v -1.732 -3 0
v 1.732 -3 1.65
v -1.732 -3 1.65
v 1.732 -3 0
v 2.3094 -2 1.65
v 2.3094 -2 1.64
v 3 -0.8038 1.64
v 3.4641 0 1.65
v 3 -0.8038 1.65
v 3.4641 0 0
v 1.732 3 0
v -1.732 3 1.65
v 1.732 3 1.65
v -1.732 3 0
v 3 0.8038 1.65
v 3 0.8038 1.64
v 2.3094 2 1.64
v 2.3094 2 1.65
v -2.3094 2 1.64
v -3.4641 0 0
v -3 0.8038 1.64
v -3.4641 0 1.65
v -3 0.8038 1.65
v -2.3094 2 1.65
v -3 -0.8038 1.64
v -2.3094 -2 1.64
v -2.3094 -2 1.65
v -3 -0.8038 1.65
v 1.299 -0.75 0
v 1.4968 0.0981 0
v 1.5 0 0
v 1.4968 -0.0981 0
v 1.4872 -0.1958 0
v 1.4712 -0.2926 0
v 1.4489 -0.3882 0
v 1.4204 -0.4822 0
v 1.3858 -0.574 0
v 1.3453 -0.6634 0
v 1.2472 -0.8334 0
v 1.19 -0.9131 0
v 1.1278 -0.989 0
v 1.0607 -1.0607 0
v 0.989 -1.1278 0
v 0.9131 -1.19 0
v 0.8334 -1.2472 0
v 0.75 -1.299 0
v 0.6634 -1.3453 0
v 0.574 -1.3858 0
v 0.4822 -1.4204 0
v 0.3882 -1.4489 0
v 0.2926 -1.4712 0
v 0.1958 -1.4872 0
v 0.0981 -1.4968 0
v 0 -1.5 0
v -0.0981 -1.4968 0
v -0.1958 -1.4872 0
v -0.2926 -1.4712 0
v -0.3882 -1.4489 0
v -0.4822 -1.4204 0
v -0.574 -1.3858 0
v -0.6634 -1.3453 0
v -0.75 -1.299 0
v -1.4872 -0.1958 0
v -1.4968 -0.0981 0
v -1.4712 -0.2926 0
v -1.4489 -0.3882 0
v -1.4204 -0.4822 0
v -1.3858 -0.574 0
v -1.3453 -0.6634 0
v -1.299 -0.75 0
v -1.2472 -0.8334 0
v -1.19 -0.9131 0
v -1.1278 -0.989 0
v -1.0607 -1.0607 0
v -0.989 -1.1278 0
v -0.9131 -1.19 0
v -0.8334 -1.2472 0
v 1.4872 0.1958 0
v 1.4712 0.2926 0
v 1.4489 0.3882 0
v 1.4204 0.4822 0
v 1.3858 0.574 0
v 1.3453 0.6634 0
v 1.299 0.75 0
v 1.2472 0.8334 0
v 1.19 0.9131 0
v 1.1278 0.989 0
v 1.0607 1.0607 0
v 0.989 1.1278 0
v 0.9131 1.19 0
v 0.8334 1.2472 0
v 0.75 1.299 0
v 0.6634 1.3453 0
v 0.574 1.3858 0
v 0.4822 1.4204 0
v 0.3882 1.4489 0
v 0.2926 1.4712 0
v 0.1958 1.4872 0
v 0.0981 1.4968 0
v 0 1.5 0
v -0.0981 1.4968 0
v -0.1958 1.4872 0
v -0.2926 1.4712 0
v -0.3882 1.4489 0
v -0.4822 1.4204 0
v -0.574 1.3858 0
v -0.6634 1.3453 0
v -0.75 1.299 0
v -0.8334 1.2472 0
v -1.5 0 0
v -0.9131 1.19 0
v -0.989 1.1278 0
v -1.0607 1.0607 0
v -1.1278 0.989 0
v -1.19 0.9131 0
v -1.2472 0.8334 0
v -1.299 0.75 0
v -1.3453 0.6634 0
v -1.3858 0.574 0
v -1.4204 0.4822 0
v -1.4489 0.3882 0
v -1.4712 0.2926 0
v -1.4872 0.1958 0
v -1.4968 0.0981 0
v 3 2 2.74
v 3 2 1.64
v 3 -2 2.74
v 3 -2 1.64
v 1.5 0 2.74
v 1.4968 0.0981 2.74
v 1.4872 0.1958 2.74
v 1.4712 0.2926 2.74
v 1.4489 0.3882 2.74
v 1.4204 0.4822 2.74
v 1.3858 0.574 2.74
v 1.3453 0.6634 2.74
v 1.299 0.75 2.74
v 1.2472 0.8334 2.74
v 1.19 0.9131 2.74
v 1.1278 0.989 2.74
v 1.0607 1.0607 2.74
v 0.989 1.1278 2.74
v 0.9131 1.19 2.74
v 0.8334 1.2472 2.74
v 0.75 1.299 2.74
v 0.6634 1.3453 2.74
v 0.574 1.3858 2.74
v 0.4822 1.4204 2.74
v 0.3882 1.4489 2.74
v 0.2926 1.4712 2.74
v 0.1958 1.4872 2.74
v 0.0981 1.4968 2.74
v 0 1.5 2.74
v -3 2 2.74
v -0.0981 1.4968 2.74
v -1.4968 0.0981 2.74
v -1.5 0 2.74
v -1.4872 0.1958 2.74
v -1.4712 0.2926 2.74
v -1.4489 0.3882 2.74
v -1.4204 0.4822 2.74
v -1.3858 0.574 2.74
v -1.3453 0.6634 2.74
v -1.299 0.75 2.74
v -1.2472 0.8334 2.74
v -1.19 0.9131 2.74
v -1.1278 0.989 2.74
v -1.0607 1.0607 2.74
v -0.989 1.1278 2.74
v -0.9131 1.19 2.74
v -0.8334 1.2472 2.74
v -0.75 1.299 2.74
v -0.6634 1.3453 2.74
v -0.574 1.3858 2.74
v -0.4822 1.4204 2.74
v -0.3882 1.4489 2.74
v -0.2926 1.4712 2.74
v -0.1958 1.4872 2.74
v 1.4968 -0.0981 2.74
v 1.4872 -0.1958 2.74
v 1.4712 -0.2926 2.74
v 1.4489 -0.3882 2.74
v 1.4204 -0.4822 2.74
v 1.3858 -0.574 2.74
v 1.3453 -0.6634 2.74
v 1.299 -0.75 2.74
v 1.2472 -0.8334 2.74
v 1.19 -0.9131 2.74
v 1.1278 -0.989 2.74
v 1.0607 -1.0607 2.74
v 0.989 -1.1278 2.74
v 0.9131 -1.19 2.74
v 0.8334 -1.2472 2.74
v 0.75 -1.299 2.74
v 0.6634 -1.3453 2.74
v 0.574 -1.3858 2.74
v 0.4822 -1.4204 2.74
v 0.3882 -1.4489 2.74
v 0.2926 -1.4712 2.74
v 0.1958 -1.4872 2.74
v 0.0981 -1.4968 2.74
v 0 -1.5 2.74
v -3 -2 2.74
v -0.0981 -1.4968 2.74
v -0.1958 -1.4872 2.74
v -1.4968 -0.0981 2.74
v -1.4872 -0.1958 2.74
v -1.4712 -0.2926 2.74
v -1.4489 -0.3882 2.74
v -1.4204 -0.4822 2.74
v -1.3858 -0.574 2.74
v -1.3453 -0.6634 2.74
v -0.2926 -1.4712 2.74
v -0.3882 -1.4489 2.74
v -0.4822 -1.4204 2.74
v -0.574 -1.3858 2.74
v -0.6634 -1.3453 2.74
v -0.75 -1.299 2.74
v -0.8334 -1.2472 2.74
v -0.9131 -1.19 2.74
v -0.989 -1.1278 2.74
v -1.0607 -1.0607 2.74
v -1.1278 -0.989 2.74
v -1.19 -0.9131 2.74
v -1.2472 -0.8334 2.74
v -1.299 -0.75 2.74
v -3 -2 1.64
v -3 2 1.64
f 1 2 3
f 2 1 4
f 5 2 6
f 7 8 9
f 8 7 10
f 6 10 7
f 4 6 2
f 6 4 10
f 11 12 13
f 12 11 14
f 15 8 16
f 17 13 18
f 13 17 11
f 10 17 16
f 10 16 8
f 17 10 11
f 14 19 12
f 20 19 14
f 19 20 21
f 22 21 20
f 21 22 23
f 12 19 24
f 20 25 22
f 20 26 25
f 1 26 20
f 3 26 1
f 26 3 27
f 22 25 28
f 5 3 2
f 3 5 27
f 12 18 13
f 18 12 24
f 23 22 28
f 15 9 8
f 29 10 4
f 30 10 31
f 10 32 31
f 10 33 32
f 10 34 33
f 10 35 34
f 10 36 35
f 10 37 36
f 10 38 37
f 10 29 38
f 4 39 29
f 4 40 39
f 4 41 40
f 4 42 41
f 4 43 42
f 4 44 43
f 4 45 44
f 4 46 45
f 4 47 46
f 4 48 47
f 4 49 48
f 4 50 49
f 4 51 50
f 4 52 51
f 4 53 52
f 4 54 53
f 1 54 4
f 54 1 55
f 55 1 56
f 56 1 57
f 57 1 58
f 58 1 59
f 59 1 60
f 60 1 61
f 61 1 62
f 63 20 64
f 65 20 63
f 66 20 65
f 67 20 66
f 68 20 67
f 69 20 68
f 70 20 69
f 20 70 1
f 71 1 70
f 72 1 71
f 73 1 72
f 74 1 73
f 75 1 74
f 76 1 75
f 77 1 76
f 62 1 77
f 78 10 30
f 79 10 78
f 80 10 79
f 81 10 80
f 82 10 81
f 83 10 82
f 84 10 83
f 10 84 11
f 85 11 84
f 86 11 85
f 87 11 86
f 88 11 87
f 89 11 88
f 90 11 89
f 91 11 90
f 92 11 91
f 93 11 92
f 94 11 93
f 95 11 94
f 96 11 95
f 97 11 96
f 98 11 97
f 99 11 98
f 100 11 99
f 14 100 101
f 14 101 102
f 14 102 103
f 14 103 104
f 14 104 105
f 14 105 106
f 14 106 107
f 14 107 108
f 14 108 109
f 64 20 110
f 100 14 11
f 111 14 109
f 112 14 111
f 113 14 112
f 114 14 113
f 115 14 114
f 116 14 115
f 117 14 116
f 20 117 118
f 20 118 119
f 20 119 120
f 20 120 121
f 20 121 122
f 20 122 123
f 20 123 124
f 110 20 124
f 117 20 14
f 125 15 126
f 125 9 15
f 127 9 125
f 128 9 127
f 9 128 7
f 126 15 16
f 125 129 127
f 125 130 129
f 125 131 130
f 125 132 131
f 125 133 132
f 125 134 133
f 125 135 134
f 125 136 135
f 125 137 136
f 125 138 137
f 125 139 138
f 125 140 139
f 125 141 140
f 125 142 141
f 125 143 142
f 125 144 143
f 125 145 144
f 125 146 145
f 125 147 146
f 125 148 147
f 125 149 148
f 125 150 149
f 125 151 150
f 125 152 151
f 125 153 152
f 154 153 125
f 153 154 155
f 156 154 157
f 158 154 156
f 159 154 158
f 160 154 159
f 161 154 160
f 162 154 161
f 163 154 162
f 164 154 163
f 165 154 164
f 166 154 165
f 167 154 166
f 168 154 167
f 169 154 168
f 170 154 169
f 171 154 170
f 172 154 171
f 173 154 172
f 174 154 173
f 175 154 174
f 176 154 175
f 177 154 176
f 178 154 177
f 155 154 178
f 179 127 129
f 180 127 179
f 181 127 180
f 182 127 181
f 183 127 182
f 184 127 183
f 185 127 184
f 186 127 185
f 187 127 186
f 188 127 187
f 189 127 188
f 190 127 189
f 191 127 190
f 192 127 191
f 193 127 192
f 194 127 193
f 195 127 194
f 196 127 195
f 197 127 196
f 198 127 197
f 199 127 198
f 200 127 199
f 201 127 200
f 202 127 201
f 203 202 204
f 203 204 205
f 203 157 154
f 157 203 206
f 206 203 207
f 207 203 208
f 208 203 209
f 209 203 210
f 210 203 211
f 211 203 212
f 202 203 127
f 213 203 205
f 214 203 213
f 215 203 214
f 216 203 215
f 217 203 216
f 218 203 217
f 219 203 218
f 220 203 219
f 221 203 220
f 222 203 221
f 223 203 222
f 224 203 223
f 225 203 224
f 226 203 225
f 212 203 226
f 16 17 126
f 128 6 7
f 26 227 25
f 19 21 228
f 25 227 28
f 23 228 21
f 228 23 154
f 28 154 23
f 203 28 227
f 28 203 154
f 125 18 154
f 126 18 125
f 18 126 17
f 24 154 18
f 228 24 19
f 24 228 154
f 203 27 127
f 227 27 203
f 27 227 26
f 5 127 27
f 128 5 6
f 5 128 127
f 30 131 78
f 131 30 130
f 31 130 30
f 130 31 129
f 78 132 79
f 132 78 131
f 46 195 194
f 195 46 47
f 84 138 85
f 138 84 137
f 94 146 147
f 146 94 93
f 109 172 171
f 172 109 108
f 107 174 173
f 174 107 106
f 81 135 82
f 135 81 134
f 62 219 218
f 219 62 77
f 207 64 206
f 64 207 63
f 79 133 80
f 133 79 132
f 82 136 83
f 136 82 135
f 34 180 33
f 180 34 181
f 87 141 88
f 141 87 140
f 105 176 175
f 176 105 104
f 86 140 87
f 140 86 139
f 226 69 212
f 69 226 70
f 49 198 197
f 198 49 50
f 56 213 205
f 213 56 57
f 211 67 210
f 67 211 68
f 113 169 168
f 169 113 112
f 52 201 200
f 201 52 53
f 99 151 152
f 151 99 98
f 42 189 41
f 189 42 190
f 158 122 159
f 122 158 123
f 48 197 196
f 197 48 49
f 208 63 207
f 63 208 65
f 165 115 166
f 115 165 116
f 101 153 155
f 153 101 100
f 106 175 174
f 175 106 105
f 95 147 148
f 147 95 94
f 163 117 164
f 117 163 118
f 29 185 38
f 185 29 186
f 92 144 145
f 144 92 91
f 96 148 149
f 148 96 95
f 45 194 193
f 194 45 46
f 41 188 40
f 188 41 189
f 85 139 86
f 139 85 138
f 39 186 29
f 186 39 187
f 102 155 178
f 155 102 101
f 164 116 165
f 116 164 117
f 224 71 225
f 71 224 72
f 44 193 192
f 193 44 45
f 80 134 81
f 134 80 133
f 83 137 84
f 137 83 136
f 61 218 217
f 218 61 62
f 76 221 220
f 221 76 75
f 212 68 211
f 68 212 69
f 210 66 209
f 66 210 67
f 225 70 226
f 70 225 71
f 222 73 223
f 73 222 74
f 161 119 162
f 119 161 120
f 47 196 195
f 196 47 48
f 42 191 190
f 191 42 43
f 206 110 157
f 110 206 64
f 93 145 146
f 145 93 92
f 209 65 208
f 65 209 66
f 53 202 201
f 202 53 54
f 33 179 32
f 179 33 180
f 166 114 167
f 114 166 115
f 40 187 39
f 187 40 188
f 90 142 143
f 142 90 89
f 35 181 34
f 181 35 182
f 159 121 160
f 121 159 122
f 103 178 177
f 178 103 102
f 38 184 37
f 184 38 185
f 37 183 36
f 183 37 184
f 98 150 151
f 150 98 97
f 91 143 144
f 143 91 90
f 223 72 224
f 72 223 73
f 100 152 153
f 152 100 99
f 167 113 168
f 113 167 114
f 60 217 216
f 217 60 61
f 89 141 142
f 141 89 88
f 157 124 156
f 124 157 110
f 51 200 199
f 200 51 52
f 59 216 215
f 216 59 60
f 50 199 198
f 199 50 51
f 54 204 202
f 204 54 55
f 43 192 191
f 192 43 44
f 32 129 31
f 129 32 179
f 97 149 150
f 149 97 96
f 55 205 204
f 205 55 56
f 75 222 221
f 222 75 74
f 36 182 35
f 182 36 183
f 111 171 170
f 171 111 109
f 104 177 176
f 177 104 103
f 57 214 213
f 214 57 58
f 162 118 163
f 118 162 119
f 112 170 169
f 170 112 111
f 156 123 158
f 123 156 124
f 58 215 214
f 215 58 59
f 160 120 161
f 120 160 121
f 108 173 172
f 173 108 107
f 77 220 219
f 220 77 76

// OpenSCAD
$fn = 96;

module t_slot_nut(
    af = 6.0,          // across flats
    thick = 2.75,      // overall thickness
    screw_d = 3.0,     // M3 clearance
    neck_w = 4.0,      // narrow "neck" width for T-slot engagement
    neck_h = 1.10      // height of the neck (undercut step)
) {
    // Derived dimensions
    r_hex = af / sqrt(3);                 // circumradius for across-flats hex
    neck_h_clamped = min(neck_h, thick);  // safety
    base_h = thick - neck_h_clamped;

    difference() {
        union() {
            // Base: hex prism (across flats = af)
            translate([0, 0, base_h/2])
                cylinder(h = base_h, r = r_hex, $fn = 6, center = true);

            // Neck: narrower rectangular step on top to create T-profile/undercut
            // Overlap by a tiny amount to guarantee connectivity
            translate([0, 0, base_h + neck_h_clamped/2 - 0.01])
                cube([af, neck_w, neck_h_clamped], center = true);
        }

        // M3 clearance hole through entire part (with small extra for clean cut)
        translate([0, 0, thick/2])
            cylinder(d = screw_d, h = thick + 0.4, center = true);
    }
}

t_slot_nut();
